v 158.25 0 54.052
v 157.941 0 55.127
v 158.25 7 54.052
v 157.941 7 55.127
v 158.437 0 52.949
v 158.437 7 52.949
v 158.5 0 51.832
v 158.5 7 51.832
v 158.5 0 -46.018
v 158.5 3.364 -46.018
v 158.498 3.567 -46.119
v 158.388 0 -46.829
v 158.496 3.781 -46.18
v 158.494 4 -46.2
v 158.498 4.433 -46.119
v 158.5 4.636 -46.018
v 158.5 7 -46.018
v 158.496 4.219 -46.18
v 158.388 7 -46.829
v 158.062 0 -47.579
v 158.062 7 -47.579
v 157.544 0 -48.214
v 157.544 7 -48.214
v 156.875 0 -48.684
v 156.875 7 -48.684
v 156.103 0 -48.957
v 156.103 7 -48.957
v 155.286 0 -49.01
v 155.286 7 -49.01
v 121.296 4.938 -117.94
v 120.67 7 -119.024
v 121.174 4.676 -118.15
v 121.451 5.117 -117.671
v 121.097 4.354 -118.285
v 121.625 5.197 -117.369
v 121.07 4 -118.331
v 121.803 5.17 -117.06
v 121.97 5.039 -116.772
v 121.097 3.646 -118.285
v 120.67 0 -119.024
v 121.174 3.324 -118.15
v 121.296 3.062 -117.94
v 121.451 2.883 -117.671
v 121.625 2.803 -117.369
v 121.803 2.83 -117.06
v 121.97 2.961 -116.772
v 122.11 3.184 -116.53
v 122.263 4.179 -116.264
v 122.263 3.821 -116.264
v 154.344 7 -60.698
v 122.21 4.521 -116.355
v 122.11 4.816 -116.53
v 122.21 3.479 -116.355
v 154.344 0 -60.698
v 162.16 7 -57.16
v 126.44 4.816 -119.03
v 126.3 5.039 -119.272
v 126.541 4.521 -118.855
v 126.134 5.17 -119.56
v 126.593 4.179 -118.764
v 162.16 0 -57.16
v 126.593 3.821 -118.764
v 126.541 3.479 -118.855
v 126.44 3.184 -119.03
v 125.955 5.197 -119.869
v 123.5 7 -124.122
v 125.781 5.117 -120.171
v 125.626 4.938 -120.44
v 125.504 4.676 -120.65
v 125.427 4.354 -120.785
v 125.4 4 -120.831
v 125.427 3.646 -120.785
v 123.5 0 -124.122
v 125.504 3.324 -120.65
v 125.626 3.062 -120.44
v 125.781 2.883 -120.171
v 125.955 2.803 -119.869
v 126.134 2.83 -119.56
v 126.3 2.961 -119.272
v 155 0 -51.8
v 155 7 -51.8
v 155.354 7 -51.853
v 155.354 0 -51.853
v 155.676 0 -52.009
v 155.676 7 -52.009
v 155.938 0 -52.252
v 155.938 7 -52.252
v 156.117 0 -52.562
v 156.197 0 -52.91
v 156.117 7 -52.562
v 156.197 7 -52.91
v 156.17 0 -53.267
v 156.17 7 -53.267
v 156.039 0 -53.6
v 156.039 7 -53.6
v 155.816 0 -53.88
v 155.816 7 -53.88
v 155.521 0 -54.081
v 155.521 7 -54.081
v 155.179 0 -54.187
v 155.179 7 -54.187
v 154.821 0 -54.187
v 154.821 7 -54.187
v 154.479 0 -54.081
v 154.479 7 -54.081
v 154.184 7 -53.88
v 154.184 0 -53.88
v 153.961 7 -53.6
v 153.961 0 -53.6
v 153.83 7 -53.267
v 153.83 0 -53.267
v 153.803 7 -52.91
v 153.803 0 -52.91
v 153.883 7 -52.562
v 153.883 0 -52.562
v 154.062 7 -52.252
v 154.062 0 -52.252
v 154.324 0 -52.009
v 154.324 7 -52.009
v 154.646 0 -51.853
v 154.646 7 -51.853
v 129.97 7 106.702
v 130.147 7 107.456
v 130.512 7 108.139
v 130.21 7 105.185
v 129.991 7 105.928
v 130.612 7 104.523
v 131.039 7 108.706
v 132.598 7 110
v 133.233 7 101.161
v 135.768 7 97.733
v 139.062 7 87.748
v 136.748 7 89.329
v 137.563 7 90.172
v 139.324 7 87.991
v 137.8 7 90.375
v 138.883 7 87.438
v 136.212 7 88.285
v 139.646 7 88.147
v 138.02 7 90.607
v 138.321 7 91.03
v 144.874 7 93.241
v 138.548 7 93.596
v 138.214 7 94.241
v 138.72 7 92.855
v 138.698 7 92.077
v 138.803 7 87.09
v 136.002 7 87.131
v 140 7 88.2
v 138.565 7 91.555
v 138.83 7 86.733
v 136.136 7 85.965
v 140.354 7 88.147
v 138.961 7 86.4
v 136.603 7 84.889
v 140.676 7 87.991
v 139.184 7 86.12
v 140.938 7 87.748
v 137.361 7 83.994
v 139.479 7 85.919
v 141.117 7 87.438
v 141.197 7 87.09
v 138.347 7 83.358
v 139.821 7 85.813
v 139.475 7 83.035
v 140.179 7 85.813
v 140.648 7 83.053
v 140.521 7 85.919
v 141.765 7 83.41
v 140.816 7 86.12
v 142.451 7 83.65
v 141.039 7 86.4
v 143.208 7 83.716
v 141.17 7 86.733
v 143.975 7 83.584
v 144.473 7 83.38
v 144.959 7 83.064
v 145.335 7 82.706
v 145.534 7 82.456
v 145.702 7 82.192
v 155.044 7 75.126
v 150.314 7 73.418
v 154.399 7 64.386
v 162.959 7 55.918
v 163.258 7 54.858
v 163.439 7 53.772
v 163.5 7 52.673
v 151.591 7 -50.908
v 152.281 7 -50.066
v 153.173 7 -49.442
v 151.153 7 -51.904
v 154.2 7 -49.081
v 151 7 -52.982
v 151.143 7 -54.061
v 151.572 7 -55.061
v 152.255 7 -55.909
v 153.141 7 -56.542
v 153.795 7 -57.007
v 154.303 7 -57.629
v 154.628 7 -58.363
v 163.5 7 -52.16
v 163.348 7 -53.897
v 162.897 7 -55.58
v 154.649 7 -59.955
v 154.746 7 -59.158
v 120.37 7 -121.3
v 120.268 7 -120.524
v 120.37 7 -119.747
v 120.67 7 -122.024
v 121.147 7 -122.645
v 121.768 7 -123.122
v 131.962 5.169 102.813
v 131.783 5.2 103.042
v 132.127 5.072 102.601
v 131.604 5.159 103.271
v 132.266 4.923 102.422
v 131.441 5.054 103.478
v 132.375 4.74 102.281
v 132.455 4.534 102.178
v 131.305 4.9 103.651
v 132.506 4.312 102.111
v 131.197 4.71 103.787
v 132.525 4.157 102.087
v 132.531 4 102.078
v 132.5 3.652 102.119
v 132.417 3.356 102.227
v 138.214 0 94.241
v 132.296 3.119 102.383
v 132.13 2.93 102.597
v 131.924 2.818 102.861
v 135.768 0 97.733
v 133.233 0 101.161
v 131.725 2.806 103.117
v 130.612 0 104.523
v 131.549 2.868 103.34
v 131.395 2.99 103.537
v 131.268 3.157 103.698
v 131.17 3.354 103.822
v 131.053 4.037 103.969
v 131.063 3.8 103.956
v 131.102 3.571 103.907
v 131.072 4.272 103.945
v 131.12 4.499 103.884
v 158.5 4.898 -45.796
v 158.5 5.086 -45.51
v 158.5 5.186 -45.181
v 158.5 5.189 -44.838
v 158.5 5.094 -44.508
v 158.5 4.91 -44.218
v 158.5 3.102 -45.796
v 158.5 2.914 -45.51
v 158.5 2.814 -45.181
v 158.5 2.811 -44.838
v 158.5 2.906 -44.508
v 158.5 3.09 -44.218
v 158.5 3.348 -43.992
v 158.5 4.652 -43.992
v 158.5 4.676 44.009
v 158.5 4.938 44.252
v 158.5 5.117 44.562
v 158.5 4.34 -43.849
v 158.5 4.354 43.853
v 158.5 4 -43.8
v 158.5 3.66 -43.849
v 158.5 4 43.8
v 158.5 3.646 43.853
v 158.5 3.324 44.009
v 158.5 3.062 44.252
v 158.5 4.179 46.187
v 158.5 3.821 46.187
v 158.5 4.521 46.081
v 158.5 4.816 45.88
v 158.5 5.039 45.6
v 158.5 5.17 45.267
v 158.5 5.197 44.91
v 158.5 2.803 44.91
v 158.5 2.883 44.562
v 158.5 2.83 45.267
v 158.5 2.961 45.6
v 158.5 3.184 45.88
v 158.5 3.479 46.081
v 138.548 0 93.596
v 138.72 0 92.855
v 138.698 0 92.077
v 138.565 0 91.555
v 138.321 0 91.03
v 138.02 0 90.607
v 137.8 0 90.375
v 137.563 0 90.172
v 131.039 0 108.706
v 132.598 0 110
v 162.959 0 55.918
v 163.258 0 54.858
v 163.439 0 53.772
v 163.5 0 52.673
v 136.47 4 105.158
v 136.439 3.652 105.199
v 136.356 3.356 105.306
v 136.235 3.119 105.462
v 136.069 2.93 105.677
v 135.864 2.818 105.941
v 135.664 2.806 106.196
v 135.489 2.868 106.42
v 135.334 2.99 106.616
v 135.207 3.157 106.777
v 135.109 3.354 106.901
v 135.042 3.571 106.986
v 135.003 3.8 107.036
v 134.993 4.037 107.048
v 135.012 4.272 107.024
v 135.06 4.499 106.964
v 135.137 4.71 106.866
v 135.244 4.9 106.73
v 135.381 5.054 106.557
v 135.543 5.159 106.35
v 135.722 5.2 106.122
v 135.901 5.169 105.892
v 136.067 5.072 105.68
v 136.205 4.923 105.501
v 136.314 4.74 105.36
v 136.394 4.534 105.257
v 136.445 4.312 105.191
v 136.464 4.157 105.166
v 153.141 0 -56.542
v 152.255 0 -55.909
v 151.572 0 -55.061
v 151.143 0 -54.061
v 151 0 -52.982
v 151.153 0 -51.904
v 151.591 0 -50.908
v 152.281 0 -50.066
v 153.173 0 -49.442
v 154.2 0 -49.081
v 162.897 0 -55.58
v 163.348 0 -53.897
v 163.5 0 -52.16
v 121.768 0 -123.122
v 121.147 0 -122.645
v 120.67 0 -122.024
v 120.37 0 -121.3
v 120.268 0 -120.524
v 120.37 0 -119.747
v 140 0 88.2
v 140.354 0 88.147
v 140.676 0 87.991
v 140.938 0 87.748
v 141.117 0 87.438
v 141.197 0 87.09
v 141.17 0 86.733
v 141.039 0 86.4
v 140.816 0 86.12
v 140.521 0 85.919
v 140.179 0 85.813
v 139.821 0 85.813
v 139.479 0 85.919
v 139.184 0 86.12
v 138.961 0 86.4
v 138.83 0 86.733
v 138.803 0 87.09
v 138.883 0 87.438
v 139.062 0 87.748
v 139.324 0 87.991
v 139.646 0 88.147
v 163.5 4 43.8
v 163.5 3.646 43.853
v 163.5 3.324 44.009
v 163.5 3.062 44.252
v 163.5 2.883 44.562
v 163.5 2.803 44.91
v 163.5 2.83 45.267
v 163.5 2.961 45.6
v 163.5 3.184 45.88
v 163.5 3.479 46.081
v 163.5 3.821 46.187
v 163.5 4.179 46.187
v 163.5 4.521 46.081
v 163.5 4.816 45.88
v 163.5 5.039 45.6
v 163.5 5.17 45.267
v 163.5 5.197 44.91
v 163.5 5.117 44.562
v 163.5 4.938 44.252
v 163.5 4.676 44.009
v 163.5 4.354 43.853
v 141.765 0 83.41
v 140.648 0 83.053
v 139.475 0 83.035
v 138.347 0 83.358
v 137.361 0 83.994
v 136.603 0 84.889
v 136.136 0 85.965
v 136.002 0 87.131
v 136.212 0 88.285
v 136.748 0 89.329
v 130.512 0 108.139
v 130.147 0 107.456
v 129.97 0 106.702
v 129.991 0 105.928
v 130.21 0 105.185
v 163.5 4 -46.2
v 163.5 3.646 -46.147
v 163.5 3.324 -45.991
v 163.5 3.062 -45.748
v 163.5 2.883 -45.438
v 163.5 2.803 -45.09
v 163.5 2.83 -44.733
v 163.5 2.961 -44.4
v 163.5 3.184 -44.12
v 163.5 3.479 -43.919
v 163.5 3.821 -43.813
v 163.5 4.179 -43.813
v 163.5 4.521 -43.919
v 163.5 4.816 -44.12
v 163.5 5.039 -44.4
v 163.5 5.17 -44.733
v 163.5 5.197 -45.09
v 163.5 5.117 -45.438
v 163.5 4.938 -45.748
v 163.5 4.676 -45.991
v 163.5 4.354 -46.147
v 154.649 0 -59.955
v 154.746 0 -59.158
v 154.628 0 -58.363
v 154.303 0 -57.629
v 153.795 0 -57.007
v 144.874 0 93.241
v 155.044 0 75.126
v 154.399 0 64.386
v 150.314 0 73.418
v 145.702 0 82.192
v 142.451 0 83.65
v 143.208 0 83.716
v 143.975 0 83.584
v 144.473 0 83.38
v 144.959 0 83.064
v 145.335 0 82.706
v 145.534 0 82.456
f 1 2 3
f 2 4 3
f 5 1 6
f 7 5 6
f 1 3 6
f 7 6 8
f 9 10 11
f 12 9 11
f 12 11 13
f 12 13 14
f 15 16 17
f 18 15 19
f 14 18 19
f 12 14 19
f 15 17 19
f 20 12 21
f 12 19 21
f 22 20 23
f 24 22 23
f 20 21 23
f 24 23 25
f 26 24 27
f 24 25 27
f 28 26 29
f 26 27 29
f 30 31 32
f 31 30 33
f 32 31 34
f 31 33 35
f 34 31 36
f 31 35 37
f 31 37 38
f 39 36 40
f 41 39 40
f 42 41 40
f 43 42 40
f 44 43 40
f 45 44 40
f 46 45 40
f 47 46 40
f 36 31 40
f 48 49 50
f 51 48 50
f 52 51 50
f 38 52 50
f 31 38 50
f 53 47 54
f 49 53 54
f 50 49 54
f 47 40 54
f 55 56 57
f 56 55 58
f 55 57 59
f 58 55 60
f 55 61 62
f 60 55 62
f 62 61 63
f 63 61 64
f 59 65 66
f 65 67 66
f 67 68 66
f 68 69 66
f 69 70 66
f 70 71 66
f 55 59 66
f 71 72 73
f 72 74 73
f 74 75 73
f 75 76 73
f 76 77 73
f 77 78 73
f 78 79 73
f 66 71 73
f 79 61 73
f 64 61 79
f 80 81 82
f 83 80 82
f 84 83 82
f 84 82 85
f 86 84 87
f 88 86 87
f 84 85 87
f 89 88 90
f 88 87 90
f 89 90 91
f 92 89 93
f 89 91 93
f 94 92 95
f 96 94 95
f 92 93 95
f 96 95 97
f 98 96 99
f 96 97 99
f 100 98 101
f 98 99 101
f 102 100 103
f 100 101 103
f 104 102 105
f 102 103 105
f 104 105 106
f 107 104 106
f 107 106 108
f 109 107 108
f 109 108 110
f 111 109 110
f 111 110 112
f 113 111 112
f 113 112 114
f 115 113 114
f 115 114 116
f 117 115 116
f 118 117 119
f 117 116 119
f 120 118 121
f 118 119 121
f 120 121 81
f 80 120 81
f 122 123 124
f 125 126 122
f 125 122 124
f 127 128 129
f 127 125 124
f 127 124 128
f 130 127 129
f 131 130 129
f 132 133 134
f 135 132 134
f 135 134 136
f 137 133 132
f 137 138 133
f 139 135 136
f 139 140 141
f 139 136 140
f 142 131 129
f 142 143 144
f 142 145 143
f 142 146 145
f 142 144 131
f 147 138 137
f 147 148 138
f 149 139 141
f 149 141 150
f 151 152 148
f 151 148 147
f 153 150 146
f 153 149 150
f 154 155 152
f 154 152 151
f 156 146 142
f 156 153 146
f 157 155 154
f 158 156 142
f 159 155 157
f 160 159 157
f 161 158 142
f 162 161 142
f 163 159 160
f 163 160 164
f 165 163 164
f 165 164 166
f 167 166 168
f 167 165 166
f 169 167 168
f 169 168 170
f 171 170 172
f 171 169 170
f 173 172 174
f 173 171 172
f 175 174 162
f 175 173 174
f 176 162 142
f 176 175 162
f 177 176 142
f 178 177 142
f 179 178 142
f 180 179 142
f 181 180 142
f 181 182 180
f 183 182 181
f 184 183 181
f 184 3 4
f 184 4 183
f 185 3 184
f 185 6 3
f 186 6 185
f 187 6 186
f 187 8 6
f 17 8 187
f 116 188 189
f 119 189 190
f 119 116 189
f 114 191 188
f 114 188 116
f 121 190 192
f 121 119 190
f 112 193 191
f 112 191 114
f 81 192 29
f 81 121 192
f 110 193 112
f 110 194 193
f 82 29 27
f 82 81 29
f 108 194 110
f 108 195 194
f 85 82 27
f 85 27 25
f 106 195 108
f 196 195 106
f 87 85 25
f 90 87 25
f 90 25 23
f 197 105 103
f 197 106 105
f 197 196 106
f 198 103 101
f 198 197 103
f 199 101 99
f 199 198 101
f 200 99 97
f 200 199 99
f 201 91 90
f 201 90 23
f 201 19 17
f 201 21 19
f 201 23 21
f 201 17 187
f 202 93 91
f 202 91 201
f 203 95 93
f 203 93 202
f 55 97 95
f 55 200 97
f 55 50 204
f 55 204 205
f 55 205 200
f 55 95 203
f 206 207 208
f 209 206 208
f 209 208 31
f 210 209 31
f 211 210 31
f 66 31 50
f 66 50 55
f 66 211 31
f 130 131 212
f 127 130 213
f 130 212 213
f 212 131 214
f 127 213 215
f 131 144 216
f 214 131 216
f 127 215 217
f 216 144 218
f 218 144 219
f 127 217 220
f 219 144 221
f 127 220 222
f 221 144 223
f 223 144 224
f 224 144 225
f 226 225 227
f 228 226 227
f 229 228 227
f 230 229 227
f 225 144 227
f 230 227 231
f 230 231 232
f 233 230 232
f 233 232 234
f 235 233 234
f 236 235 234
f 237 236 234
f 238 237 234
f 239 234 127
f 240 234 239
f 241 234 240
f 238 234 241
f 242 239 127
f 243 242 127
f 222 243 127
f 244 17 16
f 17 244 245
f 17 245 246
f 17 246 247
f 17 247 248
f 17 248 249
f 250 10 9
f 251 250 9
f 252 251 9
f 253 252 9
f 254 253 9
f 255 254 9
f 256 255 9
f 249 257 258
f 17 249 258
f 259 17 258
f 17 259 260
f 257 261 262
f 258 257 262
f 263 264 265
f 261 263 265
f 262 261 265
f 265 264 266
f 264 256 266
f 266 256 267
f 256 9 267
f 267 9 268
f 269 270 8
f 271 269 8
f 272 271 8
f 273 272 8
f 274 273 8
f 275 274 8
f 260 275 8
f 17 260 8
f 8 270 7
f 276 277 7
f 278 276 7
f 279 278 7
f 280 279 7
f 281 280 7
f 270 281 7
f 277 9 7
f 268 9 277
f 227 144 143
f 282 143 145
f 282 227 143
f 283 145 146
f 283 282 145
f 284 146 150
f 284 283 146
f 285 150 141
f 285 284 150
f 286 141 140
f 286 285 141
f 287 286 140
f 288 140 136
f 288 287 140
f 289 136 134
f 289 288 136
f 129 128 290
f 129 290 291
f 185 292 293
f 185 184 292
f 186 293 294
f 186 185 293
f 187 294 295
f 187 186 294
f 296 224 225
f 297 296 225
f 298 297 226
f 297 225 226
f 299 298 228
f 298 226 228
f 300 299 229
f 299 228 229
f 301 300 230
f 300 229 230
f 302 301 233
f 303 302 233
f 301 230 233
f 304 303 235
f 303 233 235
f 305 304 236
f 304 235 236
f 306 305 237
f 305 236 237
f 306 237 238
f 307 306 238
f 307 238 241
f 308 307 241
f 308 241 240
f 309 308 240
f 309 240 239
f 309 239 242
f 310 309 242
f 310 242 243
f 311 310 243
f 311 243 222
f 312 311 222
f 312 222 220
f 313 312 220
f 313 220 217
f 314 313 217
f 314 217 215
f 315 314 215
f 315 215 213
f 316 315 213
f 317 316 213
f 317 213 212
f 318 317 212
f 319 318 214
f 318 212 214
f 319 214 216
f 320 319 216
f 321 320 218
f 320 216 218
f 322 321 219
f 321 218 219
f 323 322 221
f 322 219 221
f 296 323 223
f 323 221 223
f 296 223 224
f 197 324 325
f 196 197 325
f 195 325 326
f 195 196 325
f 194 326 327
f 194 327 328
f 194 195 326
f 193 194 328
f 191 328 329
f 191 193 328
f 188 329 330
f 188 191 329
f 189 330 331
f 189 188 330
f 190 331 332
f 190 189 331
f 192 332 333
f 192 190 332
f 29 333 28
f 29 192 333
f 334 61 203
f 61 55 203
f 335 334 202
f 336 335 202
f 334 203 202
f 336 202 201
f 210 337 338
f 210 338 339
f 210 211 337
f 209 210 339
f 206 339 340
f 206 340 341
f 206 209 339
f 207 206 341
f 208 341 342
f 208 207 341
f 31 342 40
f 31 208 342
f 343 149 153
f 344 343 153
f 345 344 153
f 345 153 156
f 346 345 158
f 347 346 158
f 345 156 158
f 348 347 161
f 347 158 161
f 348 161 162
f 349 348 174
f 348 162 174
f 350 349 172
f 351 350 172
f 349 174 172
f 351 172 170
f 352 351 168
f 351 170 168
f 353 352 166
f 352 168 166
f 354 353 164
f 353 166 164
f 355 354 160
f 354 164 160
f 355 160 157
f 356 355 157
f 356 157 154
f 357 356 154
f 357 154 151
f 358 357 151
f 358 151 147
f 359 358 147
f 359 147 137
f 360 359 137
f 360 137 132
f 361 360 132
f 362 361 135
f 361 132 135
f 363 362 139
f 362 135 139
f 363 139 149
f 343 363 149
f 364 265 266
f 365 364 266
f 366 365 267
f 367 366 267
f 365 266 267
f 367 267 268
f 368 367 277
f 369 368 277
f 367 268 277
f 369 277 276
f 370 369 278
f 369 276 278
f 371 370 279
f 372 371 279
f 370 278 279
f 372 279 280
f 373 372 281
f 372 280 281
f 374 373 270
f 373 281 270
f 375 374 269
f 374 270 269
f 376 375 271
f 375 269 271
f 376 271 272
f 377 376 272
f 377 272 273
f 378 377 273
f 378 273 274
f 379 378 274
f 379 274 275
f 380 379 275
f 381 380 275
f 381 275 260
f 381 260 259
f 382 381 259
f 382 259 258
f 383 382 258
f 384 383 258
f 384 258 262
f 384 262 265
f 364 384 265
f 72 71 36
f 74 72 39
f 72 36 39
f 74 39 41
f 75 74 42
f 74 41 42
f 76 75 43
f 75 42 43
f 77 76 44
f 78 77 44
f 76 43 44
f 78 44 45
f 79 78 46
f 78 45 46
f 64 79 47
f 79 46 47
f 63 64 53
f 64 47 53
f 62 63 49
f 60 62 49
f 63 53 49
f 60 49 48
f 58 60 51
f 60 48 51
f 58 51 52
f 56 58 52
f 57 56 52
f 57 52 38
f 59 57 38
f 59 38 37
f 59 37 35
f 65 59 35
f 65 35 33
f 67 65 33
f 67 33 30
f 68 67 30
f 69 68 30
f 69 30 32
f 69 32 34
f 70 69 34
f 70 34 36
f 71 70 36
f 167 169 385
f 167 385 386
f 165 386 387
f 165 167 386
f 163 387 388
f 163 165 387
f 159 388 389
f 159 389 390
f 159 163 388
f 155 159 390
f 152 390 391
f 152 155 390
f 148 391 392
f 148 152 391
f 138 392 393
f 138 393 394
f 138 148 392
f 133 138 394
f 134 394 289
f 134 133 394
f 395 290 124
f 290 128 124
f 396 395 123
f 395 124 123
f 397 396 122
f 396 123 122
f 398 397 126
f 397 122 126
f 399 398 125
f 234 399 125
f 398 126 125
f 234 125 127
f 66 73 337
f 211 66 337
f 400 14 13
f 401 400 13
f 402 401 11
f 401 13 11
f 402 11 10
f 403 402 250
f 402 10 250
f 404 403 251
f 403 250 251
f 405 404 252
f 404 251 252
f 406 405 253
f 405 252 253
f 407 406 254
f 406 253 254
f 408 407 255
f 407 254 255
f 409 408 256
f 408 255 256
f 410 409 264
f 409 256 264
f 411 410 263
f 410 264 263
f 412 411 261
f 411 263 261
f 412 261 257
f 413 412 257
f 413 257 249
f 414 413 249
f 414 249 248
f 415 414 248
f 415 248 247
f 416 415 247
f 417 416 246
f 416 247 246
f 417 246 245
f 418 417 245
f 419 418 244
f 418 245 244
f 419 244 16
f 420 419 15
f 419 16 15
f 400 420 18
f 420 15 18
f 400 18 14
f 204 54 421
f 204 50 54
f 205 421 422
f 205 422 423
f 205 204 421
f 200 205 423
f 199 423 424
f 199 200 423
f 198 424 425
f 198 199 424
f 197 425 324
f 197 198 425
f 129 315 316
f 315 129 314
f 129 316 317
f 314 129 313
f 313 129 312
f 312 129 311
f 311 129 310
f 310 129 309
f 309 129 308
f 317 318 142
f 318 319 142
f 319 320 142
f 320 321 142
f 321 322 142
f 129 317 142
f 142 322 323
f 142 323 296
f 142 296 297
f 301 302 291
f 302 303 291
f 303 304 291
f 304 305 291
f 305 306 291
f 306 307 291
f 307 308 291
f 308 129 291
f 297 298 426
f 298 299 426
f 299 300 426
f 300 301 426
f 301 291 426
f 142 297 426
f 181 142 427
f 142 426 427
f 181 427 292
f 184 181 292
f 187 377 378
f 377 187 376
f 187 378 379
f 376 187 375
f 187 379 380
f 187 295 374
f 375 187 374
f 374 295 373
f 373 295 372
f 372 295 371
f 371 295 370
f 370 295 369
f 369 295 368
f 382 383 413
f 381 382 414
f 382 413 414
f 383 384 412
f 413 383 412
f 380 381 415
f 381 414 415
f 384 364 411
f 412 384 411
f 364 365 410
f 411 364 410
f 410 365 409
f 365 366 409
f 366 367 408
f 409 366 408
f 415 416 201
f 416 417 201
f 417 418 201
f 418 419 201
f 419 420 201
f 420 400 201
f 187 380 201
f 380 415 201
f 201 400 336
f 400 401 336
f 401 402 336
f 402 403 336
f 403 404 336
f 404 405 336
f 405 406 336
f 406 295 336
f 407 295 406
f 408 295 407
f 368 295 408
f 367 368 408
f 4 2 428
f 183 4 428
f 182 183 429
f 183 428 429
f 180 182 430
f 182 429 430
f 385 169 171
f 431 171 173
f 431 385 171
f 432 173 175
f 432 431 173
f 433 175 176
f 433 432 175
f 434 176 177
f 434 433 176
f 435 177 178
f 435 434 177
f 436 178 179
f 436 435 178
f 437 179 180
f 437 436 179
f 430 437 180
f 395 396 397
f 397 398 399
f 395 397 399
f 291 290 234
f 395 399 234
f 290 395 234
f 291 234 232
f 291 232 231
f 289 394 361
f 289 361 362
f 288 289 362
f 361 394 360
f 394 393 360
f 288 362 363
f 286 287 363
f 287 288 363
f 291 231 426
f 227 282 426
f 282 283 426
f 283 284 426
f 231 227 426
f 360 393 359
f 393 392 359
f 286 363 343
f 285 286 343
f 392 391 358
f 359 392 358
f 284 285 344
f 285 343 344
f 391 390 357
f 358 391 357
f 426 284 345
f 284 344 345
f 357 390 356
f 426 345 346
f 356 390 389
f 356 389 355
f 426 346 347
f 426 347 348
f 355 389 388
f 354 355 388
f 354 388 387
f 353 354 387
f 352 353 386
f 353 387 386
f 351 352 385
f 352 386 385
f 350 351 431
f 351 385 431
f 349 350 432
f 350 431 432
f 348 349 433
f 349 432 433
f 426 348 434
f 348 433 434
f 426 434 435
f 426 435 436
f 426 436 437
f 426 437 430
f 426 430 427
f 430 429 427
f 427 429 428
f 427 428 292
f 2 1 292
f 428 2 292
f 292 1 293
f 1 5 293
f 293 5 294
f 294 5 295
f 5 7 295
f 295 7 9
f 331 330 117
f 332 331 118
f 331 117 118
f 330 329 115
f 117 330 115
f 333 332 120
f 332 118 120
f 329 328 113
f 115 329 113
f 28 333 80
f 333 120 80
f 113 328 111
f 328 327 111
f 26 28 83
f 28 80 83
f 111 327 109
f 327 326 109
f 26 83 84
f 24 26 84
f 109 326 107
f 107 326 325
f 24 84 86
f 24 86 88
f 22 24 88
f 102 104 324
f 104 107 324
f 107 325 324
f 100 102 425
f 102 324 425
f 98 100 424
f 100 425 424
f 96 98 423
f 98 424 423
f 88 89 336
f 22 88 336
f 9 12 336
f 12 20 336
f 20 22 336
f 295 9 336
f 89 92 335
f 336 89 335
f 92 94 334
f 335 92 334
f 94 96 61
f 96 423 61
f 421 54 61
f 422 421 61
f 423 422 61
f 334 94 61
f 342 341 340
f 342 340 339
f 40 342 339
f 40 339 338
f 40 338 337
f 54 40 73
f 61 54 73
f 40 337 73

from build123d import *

# Parameters (mm, degrees)
BOSS_EXTRU_1_DEPTH                      = 7
ESQUISSE2_R                             = 4
ESQUISSE2_R_2                           = 1.2
BOSS_EXTRU_2_DEPTH                      = 7
CONG_1_R                                = 10
CONG_2_R                                = 3
DIAM_TRE_DU_PER_AGE_2_4_2_4_1_D         = 2.4
DIAM_TRE_DU_PER_AGE_2_4_2_4_1_ON_FACE_D = 2.4
DIAM_TRE_DU_PER_AGE_2_4_2_4_1_ON_F_2_D  = 2.4


with BuildPart() as part:
    # Esquisse1 → Boss.-Extru.1 (new body)
    with BuildSketch(Plane(origin=(0, 0, 0), x_dir=(1, 0, 0), z_dir=(0, 1, 0))):
        with BuildLine():
            Line((163.5, -54.314885969), (163.5, 54.839745962))
            Line((163.5, 54.839745962), (123.5, 124.121778265))
            Line((123.5, 124.121778265), (119.169872981, 121.621778265))
            Line((119.169872981, 121.621778265), (158.5, 53.5))
            Line((158.5, 53.5), (158.5, -53.5))
            ThreePointArc((158.5, -53.5), (146.077391865, -81.52236249), (128.750264504, -106.807627959))
            Line((128.750264504, -106.807627959), (132.598479772, -110))
            ThreePointArc((132.598479772, -110), (150.644566487, -83.59767596), (163.5, -54.314885969))
        make_face()
    extrude(amount=BOSS_EXTRU_1_DEPTH)

    # Esquisse2 → Boss.-Extru.2 (add)
    # profile 1 of 2: a face of its own
    with BuildSketch(Plane(origin=(0, 7, 0), x_dir=(1, 0, 0), z_dir=(0, 1, 0))):
        with Locations((155, 53)):
            Circle(ESQUISSE2_R)
        with Locations(Location((155, 53, 0), (0, 0, 270))):
            Circle(ESQUISSE2_R_2, mode=Mode.SUBTRACT)
    # profile 2 of 2: a face of its own
    with BuildSketch(Plane(origin=(0, 7, 0), x_dir=(1, 0, 0), z_dir=(0, 1, 0))):
        with Locations((140, -87)):
            Circle(ESQUISSE2_R)
        with Locations(Location((140, -87, 0), (0, 0, 270))):
            Circle(ESQUISSE2_R_2, mode=Mode.SUBTRACT)
    extrude(amount=-BOSS_EXTRU_2_DEPTH)

    # Congé1
    cong_1_edges = [part.edges().sort_by_distance(p)[0] for p in [
        (158.5, 3.5, 53.5),
        (163.5, 3.5, -54.839745962),
        (163.5, 3.5, 54.314885969),
    ]]
    fillet(cong_1_edges, radius=CONG_1_R)

    # Congé2
    cong_2_edges = [part.edges().sort_by_distance(p)[0] for p in [
        (128.750264504, 3.5, 106.807627959),
        (119.169872981, 3.5, -121.621778265),
        (156.697559724, 3.5, -56.621918136),
        (158.5, 3.5, -51.063508327),
        (140.380940937, 3.5, 90.981819183),
        (143.738827918, 3.5, 85.578322891),
    ]]
    fillet(cong_2_edges, radius=CONG_2_R)

    # Diamètre du perçage Ø2.4 (2.4)1 (through all)
    with Locations(Plane(origin=(135.734675085, 4, 106.105866084), x_dir=(-0.615871636874, 0, 0.787846512269), z_dir=(0.787846512269, 0, 0.615871636874))):
        with Locations((0, 0)):
            Hole(DIAM_TRE_DU_PER_AGE_2_4_2_4_1_D / 2)

    # Diamètre du perçage Ø2.4 (2.4)1 on face (through all)
    with Locations(Plane(origin=(163.5, 4, -45), x_dir=(0, 0, 1), z_dir=(1, 0, 0))):
        with Locations((0, 0), (90, 0)):
            Hole(DIAM_TRE_DU_PER_AGE_2_4_2_4_1_ON_FACE_D / 2)

    # Diamètre du perçage Ø2.4 (2.4)1 on f 2 (through all)
    with Locations(Plane(origin=(126, 4, -119.791651246), x_dir=(0.500000174844, 0, 0.866025302838), z_dir=(0.866025302838, 0, -0.500000174844))):
        with Locations((0, 0)):
            Hole(DIAM_TRE_DU_PER_AGE_2_4_2_4_1_ON_F_2_D / 2)


solid = part.part
